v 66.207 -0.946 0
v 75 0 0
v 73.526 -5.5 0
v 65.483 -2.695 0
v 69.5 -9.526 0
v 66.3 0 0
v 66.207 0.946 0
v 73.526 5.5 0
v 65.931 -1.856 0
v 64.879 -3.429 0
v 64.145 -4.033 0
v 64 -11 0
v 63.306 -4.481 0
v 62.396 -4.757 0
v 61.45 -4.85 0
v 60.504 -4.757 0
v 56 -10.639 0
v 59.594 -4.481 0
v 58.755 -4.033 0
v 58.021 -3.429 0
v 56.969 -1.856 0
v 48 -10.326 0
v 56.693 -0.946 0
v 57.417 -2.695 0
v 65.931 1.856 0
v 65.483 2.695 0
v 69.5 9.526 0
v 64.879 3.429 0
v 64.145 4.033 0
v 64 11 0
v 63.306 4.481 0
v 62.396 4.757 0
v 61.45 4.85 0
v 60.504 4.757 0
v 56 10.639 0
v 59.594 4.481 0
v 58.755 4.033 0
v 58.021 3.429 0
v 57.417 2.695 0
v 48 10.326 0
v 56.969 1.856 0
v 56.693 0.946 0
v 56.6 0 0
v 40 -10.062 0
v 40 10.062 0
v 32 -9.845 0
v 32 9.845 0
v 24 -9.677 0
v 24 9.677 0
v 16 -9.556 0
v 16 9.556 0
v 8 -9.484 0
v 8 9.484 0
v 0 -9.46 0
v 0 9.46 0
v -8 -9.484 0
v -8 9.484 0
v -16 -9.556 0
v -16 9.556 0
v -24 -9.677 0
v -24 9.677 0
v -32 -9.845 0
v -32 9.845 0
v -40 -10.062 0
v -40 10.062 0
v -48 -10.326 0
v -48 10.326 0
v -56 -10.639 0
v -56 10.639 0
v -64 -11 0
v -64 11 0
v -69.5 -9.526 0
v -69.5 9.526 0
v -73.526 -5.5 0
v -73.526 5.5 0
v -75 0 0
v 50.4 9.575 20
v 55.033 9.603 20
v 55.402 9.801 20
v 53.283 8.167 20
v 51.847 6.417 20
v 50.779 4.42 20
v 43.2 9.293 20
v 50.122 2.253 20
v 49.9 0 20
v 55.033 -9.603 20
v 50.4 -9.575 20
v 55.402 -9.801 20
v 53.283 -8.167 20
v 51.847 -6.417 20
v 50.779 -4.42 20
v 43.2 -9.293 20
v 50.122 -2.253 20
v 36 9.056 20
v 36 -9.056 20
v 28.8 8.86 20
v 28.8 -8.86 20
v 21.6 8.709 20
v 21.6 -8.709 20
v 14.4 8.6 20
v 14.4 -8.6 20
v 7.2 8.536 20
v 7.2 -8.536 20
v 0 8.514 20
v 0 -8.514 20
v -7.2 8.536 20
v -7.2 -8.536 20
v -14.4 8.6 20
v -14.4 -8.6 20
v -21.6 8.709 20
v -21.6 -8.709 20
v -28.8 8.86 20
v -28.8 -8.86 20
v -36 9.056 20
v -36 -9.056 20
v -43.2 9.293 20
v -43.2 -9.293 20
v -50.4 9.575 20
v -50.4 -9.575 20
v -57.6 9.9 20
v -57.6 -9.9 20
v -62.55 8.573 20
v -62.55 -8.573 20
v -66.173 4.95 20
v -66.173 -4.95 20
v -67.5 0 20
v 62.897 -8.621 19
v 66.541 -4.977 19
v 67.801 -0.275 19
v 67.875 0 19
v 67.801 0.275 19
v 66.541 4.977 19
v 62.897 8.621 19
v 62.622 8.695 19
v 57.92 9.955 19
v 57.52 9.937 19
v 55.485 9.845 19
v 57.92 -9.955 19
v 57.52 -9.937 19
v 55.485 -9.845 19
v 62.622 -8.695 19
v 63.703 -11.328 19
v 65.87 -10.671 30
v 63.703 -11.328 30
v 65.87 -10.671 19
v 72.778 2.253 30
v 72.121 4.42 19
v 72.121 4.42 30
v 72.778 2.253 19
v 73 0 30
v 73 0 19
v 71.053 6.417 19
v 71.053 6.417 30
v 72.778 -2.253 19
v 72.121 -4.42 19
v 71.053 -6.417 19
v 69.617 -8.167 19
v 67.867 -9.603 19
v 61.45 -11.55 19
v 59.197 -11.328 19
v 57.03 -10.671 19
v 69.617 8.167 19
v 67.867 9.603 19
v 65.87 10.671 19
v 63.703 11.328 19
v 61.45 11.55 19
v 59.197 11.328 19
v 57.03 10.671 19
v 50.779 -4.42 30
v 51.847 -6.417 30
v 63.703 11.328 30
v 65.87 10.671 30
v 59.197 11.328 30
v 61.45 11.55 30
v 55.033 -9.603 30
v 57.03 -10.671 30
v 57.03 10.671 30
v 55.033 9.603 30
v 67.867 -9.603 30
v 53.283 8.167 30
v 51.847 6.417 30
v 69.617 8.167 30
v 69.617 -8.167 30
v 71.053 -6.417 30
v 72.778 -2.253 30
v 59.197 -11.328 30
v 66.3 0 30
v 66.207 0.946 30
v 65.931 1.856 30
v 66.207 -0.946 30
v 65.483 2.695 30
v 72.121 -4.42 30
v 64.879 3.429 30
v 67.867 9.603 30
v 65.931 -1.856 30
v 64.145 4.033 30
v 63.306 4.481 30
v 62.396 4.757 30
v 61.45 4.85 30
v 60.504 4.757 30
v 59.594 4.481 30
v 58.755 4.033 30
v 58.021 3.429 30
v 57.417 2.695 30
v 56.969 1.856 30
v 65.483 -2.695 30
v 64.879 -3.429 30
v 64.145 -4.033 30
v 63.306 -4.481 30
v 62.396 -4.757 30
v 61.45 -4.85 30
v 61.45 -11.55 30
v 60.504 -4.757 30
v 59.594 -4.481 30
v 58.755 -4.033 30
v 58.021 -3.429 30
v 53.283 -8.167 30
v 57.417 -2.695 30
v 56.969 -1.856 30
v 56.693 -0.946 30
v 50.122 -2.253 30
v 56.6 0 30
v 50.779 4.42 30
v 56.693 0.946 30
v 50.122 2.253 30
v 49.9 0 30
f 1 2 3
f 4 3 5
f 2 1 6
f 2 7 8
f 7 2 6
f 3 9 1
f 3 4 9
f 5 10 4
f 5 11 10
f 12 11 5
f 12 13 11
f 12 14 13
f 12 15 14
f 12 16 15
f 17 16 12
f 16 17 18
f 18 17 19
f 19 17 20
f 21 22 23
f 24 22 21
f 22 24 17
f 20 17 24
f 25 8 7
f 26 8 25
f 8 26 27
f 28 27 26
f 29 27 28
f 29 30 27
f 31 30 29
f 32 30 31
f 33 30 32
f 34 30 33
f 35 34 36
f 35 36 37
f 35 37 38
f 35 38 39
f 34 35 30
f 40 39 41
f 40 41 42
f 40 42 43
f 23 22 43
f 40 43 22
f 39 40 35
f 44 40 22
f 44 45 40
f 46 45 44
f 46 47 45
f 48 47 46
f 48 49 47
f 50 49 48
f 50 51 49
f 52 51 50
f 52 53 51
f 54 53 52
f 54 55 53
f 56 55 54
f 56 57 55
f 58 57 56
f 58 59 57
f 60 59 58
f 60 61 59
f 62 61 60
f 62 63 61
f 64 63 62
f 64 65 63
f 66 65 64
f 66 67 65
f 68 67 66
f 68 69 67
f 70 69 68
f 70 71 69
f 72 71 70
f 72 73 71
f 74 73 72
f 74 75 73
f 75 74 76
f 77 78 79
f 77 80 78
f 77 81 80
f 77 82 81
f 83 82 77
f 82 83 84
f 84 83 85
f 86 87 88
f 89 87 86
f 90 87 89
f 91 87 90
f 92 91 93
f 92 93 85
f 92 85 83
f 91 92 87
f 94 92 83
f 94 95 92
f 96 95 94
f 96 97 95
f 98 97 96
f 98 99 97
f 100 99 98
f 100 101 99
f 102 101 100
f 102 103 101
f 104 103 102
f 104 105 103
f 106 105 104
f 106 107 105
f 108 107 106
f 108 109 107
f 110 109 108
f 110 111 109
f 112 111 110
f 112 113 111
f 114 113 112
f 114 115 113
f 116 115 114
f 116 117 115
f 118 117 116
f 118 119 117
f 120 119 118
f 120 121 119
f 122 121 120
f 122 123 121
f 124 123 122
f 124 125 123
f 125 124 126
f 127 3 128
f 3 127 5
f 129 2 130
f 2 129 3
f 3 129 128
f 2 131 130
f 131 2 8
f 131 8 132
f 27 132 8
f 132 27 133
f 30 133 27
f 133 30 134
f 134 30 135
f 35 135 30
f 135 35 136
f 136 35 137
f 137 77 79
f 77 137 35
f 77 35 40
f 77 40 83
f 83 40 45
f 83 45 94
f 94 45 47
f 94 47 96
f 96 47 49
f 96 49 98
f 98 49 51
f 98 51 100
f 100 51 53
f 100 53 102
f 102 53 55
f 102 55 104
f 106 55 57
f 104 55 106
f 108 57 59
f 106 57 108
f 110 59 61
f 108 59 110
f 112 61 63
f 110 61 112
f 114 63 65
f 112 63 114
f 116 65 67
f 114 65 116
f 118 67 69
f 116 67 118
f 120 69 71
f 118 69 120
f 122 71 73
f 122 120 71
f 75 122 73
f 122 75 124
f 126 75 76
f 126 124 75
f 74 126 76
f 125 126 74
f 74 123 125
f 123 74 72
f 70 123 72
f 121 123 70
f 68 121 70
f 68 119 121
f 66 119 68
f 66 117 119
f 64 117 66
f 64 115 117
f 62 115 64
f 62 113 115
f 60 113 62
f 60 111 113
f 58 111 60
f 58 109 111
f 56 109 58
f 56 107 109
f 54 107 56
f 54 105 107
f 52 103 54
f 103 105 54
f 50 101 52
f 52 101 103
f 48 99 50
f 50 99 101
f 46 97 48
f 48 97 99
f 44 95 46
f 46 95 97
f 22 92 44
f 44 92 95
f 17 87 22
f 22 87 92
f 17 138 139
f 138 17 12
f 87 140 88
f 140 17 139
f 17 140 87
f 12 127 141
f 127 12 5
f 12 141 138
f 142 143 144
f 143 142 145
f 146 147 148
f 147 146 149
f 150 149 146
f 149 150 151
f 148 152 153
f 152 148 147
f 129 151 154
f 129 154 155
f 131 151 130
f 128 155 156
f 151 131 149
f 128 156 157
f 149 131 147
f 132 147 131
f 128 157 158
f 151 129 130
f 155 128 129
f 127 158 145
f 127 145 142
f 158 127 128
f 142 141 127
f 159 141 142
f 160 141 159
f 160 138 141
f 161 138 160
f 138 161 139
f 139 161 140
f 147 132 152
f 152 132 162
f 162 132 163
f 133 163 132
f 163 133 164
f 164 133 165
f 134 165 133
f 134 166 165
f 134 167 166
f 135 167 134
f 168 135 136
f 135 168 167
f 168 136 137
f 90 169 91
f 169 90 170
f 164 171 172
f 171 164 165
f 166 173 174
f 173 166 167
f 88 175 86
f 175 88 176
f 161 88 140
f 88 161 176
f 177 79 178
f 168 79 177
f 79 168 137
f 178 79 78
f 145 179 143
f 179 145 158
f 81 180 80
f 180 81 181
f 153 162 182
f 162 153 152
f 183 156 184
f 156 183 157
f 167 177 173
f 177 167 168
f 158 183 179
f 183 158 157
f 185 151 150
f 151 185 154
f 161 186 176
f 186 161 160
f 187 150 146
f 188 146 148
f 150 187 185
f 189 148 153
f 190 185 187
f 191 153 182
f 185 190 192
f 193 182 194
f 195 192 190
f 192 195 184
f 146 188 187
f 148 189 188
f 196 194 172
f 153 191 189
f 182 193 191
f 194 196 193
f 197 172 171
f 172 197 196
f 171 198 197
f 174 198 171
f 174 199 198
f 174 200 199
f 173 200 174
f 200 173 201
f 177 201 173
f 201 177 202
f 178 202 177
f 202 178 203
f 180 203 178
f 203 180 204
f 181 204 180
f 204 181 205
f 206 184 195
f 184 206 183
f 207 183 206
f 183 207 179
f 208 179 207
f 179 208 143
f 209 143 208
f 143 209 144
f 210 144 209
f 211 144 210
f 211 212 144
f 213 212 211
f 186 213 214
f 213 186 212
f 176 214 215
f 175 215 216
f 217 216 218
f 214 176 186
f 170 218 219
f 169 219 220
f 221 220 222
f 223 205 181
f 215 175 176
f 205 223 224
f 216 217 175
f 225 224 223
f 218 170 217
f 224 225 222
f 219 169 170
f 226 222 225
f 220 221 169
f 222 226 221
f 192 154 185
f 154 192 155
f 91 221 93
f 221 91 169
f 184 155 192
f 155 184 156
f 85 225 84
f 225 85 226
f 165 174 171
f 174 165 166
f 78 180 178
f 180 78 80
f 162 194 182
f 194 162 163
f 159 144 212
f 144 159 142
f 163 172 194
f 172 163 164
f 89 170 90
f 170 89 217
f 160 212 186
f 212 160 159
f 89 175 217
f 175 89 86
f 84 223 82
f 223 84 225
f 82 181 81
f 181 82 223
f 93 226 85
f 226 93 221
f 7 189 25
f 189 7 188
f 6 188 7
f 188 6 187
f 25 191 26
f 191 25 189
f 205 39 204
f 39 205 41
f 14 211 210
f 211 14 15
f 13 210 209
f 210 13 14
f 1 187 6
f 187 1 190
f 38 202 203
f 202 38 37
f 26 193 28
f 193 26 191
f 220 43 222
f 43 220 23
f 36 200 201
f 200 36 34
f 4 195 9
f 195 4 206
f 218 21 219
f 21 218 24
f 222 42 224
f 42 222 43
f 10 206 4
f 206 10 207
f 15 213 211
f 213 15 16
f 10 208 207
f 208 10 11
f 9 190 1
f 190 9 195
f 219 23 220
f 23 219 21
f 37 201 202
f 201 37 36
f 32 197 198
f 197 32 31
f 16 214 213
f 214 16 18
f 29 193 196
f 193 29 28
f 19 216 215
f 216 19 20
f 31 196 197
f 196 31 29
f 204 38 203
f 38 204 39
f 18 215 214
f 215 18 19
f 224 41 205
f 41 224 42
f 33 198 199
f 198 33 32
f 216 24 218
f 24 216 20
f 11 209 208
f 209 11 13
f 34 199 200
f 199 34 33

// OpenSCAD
$fn = 32;

// ----------------------------------------------------------------------
// Handle: 150 x 22 mm grip, 20 mm thick
// ----------------------------------------------------------------------

// --- parameters (mm) ---
length = 150;             // grip length
width = 22;               // grip width
thickness = 20;           // grip thickness
waist = 0.86;             // width factor at the middle
draft = 0.9;              // top face scale of the extrusion
boss_d = 23.1;            // mounting boss diameter
boss_h = 10;              // mounting boss height
boss_hole_d = 9.7;        // screw clearance through the boss
boss_r = 61.45;           // boss centre from the grip centre

/* ergonomic grip outline, closed spline-like polygon in the XY plane */
grip = [[-64, 11], [-56, 10.639], [-48, 10.326], [-40, 10.062], [-32, 9.845], [-24, 9.677], [-16, 9.556], [-8, 9.484], [0, 9.46], [8, 9.484], [16, 9.556], [24, 9.677], [32, 9.845], [40, 10.062], [48, 10.326], [56, 10.639], [64, 11], [69.5, 9.526], [73.526, 5.5], [75, 0], [73.526, -5.5], [69.5, -9.526], [64, -11], [64, -11], [56, -10.639], [48, -10.326], [40, -10.062], [32, -9.845], [24, -9.677], [16, -9.556], [8, -9.484], [0, -9.46], [-8, -9.484], [-16, -9.556], [-24, -9.677], [-32, -9.845], [-40, -10.062], [-48, -10.326], [-56, -10.639], [-64, -11], [-69.5, -9.526], [-73.526, -5.5], [-75, 0], [-73.526, 5.5], [-69.5, 9.526], [-64, 11]];

module grip_body() {
  linear_extrude(height = thickness, scale = draft) polygon(grip);
}

module boss_body() {
  /* sunk 1 mm into the grip so the joint overlaps */
  translate([boss_r, 0, thickness - 1]) cylinder(h = boss_h + 1, d = boss_d);
}

difference() {
  union() {
    grip_body();
    boss_body();
  }
  translate([boss_r, 0, -1]) cylinder(h = thickness + boss_h + 2, d = boss_hole_d);
}
